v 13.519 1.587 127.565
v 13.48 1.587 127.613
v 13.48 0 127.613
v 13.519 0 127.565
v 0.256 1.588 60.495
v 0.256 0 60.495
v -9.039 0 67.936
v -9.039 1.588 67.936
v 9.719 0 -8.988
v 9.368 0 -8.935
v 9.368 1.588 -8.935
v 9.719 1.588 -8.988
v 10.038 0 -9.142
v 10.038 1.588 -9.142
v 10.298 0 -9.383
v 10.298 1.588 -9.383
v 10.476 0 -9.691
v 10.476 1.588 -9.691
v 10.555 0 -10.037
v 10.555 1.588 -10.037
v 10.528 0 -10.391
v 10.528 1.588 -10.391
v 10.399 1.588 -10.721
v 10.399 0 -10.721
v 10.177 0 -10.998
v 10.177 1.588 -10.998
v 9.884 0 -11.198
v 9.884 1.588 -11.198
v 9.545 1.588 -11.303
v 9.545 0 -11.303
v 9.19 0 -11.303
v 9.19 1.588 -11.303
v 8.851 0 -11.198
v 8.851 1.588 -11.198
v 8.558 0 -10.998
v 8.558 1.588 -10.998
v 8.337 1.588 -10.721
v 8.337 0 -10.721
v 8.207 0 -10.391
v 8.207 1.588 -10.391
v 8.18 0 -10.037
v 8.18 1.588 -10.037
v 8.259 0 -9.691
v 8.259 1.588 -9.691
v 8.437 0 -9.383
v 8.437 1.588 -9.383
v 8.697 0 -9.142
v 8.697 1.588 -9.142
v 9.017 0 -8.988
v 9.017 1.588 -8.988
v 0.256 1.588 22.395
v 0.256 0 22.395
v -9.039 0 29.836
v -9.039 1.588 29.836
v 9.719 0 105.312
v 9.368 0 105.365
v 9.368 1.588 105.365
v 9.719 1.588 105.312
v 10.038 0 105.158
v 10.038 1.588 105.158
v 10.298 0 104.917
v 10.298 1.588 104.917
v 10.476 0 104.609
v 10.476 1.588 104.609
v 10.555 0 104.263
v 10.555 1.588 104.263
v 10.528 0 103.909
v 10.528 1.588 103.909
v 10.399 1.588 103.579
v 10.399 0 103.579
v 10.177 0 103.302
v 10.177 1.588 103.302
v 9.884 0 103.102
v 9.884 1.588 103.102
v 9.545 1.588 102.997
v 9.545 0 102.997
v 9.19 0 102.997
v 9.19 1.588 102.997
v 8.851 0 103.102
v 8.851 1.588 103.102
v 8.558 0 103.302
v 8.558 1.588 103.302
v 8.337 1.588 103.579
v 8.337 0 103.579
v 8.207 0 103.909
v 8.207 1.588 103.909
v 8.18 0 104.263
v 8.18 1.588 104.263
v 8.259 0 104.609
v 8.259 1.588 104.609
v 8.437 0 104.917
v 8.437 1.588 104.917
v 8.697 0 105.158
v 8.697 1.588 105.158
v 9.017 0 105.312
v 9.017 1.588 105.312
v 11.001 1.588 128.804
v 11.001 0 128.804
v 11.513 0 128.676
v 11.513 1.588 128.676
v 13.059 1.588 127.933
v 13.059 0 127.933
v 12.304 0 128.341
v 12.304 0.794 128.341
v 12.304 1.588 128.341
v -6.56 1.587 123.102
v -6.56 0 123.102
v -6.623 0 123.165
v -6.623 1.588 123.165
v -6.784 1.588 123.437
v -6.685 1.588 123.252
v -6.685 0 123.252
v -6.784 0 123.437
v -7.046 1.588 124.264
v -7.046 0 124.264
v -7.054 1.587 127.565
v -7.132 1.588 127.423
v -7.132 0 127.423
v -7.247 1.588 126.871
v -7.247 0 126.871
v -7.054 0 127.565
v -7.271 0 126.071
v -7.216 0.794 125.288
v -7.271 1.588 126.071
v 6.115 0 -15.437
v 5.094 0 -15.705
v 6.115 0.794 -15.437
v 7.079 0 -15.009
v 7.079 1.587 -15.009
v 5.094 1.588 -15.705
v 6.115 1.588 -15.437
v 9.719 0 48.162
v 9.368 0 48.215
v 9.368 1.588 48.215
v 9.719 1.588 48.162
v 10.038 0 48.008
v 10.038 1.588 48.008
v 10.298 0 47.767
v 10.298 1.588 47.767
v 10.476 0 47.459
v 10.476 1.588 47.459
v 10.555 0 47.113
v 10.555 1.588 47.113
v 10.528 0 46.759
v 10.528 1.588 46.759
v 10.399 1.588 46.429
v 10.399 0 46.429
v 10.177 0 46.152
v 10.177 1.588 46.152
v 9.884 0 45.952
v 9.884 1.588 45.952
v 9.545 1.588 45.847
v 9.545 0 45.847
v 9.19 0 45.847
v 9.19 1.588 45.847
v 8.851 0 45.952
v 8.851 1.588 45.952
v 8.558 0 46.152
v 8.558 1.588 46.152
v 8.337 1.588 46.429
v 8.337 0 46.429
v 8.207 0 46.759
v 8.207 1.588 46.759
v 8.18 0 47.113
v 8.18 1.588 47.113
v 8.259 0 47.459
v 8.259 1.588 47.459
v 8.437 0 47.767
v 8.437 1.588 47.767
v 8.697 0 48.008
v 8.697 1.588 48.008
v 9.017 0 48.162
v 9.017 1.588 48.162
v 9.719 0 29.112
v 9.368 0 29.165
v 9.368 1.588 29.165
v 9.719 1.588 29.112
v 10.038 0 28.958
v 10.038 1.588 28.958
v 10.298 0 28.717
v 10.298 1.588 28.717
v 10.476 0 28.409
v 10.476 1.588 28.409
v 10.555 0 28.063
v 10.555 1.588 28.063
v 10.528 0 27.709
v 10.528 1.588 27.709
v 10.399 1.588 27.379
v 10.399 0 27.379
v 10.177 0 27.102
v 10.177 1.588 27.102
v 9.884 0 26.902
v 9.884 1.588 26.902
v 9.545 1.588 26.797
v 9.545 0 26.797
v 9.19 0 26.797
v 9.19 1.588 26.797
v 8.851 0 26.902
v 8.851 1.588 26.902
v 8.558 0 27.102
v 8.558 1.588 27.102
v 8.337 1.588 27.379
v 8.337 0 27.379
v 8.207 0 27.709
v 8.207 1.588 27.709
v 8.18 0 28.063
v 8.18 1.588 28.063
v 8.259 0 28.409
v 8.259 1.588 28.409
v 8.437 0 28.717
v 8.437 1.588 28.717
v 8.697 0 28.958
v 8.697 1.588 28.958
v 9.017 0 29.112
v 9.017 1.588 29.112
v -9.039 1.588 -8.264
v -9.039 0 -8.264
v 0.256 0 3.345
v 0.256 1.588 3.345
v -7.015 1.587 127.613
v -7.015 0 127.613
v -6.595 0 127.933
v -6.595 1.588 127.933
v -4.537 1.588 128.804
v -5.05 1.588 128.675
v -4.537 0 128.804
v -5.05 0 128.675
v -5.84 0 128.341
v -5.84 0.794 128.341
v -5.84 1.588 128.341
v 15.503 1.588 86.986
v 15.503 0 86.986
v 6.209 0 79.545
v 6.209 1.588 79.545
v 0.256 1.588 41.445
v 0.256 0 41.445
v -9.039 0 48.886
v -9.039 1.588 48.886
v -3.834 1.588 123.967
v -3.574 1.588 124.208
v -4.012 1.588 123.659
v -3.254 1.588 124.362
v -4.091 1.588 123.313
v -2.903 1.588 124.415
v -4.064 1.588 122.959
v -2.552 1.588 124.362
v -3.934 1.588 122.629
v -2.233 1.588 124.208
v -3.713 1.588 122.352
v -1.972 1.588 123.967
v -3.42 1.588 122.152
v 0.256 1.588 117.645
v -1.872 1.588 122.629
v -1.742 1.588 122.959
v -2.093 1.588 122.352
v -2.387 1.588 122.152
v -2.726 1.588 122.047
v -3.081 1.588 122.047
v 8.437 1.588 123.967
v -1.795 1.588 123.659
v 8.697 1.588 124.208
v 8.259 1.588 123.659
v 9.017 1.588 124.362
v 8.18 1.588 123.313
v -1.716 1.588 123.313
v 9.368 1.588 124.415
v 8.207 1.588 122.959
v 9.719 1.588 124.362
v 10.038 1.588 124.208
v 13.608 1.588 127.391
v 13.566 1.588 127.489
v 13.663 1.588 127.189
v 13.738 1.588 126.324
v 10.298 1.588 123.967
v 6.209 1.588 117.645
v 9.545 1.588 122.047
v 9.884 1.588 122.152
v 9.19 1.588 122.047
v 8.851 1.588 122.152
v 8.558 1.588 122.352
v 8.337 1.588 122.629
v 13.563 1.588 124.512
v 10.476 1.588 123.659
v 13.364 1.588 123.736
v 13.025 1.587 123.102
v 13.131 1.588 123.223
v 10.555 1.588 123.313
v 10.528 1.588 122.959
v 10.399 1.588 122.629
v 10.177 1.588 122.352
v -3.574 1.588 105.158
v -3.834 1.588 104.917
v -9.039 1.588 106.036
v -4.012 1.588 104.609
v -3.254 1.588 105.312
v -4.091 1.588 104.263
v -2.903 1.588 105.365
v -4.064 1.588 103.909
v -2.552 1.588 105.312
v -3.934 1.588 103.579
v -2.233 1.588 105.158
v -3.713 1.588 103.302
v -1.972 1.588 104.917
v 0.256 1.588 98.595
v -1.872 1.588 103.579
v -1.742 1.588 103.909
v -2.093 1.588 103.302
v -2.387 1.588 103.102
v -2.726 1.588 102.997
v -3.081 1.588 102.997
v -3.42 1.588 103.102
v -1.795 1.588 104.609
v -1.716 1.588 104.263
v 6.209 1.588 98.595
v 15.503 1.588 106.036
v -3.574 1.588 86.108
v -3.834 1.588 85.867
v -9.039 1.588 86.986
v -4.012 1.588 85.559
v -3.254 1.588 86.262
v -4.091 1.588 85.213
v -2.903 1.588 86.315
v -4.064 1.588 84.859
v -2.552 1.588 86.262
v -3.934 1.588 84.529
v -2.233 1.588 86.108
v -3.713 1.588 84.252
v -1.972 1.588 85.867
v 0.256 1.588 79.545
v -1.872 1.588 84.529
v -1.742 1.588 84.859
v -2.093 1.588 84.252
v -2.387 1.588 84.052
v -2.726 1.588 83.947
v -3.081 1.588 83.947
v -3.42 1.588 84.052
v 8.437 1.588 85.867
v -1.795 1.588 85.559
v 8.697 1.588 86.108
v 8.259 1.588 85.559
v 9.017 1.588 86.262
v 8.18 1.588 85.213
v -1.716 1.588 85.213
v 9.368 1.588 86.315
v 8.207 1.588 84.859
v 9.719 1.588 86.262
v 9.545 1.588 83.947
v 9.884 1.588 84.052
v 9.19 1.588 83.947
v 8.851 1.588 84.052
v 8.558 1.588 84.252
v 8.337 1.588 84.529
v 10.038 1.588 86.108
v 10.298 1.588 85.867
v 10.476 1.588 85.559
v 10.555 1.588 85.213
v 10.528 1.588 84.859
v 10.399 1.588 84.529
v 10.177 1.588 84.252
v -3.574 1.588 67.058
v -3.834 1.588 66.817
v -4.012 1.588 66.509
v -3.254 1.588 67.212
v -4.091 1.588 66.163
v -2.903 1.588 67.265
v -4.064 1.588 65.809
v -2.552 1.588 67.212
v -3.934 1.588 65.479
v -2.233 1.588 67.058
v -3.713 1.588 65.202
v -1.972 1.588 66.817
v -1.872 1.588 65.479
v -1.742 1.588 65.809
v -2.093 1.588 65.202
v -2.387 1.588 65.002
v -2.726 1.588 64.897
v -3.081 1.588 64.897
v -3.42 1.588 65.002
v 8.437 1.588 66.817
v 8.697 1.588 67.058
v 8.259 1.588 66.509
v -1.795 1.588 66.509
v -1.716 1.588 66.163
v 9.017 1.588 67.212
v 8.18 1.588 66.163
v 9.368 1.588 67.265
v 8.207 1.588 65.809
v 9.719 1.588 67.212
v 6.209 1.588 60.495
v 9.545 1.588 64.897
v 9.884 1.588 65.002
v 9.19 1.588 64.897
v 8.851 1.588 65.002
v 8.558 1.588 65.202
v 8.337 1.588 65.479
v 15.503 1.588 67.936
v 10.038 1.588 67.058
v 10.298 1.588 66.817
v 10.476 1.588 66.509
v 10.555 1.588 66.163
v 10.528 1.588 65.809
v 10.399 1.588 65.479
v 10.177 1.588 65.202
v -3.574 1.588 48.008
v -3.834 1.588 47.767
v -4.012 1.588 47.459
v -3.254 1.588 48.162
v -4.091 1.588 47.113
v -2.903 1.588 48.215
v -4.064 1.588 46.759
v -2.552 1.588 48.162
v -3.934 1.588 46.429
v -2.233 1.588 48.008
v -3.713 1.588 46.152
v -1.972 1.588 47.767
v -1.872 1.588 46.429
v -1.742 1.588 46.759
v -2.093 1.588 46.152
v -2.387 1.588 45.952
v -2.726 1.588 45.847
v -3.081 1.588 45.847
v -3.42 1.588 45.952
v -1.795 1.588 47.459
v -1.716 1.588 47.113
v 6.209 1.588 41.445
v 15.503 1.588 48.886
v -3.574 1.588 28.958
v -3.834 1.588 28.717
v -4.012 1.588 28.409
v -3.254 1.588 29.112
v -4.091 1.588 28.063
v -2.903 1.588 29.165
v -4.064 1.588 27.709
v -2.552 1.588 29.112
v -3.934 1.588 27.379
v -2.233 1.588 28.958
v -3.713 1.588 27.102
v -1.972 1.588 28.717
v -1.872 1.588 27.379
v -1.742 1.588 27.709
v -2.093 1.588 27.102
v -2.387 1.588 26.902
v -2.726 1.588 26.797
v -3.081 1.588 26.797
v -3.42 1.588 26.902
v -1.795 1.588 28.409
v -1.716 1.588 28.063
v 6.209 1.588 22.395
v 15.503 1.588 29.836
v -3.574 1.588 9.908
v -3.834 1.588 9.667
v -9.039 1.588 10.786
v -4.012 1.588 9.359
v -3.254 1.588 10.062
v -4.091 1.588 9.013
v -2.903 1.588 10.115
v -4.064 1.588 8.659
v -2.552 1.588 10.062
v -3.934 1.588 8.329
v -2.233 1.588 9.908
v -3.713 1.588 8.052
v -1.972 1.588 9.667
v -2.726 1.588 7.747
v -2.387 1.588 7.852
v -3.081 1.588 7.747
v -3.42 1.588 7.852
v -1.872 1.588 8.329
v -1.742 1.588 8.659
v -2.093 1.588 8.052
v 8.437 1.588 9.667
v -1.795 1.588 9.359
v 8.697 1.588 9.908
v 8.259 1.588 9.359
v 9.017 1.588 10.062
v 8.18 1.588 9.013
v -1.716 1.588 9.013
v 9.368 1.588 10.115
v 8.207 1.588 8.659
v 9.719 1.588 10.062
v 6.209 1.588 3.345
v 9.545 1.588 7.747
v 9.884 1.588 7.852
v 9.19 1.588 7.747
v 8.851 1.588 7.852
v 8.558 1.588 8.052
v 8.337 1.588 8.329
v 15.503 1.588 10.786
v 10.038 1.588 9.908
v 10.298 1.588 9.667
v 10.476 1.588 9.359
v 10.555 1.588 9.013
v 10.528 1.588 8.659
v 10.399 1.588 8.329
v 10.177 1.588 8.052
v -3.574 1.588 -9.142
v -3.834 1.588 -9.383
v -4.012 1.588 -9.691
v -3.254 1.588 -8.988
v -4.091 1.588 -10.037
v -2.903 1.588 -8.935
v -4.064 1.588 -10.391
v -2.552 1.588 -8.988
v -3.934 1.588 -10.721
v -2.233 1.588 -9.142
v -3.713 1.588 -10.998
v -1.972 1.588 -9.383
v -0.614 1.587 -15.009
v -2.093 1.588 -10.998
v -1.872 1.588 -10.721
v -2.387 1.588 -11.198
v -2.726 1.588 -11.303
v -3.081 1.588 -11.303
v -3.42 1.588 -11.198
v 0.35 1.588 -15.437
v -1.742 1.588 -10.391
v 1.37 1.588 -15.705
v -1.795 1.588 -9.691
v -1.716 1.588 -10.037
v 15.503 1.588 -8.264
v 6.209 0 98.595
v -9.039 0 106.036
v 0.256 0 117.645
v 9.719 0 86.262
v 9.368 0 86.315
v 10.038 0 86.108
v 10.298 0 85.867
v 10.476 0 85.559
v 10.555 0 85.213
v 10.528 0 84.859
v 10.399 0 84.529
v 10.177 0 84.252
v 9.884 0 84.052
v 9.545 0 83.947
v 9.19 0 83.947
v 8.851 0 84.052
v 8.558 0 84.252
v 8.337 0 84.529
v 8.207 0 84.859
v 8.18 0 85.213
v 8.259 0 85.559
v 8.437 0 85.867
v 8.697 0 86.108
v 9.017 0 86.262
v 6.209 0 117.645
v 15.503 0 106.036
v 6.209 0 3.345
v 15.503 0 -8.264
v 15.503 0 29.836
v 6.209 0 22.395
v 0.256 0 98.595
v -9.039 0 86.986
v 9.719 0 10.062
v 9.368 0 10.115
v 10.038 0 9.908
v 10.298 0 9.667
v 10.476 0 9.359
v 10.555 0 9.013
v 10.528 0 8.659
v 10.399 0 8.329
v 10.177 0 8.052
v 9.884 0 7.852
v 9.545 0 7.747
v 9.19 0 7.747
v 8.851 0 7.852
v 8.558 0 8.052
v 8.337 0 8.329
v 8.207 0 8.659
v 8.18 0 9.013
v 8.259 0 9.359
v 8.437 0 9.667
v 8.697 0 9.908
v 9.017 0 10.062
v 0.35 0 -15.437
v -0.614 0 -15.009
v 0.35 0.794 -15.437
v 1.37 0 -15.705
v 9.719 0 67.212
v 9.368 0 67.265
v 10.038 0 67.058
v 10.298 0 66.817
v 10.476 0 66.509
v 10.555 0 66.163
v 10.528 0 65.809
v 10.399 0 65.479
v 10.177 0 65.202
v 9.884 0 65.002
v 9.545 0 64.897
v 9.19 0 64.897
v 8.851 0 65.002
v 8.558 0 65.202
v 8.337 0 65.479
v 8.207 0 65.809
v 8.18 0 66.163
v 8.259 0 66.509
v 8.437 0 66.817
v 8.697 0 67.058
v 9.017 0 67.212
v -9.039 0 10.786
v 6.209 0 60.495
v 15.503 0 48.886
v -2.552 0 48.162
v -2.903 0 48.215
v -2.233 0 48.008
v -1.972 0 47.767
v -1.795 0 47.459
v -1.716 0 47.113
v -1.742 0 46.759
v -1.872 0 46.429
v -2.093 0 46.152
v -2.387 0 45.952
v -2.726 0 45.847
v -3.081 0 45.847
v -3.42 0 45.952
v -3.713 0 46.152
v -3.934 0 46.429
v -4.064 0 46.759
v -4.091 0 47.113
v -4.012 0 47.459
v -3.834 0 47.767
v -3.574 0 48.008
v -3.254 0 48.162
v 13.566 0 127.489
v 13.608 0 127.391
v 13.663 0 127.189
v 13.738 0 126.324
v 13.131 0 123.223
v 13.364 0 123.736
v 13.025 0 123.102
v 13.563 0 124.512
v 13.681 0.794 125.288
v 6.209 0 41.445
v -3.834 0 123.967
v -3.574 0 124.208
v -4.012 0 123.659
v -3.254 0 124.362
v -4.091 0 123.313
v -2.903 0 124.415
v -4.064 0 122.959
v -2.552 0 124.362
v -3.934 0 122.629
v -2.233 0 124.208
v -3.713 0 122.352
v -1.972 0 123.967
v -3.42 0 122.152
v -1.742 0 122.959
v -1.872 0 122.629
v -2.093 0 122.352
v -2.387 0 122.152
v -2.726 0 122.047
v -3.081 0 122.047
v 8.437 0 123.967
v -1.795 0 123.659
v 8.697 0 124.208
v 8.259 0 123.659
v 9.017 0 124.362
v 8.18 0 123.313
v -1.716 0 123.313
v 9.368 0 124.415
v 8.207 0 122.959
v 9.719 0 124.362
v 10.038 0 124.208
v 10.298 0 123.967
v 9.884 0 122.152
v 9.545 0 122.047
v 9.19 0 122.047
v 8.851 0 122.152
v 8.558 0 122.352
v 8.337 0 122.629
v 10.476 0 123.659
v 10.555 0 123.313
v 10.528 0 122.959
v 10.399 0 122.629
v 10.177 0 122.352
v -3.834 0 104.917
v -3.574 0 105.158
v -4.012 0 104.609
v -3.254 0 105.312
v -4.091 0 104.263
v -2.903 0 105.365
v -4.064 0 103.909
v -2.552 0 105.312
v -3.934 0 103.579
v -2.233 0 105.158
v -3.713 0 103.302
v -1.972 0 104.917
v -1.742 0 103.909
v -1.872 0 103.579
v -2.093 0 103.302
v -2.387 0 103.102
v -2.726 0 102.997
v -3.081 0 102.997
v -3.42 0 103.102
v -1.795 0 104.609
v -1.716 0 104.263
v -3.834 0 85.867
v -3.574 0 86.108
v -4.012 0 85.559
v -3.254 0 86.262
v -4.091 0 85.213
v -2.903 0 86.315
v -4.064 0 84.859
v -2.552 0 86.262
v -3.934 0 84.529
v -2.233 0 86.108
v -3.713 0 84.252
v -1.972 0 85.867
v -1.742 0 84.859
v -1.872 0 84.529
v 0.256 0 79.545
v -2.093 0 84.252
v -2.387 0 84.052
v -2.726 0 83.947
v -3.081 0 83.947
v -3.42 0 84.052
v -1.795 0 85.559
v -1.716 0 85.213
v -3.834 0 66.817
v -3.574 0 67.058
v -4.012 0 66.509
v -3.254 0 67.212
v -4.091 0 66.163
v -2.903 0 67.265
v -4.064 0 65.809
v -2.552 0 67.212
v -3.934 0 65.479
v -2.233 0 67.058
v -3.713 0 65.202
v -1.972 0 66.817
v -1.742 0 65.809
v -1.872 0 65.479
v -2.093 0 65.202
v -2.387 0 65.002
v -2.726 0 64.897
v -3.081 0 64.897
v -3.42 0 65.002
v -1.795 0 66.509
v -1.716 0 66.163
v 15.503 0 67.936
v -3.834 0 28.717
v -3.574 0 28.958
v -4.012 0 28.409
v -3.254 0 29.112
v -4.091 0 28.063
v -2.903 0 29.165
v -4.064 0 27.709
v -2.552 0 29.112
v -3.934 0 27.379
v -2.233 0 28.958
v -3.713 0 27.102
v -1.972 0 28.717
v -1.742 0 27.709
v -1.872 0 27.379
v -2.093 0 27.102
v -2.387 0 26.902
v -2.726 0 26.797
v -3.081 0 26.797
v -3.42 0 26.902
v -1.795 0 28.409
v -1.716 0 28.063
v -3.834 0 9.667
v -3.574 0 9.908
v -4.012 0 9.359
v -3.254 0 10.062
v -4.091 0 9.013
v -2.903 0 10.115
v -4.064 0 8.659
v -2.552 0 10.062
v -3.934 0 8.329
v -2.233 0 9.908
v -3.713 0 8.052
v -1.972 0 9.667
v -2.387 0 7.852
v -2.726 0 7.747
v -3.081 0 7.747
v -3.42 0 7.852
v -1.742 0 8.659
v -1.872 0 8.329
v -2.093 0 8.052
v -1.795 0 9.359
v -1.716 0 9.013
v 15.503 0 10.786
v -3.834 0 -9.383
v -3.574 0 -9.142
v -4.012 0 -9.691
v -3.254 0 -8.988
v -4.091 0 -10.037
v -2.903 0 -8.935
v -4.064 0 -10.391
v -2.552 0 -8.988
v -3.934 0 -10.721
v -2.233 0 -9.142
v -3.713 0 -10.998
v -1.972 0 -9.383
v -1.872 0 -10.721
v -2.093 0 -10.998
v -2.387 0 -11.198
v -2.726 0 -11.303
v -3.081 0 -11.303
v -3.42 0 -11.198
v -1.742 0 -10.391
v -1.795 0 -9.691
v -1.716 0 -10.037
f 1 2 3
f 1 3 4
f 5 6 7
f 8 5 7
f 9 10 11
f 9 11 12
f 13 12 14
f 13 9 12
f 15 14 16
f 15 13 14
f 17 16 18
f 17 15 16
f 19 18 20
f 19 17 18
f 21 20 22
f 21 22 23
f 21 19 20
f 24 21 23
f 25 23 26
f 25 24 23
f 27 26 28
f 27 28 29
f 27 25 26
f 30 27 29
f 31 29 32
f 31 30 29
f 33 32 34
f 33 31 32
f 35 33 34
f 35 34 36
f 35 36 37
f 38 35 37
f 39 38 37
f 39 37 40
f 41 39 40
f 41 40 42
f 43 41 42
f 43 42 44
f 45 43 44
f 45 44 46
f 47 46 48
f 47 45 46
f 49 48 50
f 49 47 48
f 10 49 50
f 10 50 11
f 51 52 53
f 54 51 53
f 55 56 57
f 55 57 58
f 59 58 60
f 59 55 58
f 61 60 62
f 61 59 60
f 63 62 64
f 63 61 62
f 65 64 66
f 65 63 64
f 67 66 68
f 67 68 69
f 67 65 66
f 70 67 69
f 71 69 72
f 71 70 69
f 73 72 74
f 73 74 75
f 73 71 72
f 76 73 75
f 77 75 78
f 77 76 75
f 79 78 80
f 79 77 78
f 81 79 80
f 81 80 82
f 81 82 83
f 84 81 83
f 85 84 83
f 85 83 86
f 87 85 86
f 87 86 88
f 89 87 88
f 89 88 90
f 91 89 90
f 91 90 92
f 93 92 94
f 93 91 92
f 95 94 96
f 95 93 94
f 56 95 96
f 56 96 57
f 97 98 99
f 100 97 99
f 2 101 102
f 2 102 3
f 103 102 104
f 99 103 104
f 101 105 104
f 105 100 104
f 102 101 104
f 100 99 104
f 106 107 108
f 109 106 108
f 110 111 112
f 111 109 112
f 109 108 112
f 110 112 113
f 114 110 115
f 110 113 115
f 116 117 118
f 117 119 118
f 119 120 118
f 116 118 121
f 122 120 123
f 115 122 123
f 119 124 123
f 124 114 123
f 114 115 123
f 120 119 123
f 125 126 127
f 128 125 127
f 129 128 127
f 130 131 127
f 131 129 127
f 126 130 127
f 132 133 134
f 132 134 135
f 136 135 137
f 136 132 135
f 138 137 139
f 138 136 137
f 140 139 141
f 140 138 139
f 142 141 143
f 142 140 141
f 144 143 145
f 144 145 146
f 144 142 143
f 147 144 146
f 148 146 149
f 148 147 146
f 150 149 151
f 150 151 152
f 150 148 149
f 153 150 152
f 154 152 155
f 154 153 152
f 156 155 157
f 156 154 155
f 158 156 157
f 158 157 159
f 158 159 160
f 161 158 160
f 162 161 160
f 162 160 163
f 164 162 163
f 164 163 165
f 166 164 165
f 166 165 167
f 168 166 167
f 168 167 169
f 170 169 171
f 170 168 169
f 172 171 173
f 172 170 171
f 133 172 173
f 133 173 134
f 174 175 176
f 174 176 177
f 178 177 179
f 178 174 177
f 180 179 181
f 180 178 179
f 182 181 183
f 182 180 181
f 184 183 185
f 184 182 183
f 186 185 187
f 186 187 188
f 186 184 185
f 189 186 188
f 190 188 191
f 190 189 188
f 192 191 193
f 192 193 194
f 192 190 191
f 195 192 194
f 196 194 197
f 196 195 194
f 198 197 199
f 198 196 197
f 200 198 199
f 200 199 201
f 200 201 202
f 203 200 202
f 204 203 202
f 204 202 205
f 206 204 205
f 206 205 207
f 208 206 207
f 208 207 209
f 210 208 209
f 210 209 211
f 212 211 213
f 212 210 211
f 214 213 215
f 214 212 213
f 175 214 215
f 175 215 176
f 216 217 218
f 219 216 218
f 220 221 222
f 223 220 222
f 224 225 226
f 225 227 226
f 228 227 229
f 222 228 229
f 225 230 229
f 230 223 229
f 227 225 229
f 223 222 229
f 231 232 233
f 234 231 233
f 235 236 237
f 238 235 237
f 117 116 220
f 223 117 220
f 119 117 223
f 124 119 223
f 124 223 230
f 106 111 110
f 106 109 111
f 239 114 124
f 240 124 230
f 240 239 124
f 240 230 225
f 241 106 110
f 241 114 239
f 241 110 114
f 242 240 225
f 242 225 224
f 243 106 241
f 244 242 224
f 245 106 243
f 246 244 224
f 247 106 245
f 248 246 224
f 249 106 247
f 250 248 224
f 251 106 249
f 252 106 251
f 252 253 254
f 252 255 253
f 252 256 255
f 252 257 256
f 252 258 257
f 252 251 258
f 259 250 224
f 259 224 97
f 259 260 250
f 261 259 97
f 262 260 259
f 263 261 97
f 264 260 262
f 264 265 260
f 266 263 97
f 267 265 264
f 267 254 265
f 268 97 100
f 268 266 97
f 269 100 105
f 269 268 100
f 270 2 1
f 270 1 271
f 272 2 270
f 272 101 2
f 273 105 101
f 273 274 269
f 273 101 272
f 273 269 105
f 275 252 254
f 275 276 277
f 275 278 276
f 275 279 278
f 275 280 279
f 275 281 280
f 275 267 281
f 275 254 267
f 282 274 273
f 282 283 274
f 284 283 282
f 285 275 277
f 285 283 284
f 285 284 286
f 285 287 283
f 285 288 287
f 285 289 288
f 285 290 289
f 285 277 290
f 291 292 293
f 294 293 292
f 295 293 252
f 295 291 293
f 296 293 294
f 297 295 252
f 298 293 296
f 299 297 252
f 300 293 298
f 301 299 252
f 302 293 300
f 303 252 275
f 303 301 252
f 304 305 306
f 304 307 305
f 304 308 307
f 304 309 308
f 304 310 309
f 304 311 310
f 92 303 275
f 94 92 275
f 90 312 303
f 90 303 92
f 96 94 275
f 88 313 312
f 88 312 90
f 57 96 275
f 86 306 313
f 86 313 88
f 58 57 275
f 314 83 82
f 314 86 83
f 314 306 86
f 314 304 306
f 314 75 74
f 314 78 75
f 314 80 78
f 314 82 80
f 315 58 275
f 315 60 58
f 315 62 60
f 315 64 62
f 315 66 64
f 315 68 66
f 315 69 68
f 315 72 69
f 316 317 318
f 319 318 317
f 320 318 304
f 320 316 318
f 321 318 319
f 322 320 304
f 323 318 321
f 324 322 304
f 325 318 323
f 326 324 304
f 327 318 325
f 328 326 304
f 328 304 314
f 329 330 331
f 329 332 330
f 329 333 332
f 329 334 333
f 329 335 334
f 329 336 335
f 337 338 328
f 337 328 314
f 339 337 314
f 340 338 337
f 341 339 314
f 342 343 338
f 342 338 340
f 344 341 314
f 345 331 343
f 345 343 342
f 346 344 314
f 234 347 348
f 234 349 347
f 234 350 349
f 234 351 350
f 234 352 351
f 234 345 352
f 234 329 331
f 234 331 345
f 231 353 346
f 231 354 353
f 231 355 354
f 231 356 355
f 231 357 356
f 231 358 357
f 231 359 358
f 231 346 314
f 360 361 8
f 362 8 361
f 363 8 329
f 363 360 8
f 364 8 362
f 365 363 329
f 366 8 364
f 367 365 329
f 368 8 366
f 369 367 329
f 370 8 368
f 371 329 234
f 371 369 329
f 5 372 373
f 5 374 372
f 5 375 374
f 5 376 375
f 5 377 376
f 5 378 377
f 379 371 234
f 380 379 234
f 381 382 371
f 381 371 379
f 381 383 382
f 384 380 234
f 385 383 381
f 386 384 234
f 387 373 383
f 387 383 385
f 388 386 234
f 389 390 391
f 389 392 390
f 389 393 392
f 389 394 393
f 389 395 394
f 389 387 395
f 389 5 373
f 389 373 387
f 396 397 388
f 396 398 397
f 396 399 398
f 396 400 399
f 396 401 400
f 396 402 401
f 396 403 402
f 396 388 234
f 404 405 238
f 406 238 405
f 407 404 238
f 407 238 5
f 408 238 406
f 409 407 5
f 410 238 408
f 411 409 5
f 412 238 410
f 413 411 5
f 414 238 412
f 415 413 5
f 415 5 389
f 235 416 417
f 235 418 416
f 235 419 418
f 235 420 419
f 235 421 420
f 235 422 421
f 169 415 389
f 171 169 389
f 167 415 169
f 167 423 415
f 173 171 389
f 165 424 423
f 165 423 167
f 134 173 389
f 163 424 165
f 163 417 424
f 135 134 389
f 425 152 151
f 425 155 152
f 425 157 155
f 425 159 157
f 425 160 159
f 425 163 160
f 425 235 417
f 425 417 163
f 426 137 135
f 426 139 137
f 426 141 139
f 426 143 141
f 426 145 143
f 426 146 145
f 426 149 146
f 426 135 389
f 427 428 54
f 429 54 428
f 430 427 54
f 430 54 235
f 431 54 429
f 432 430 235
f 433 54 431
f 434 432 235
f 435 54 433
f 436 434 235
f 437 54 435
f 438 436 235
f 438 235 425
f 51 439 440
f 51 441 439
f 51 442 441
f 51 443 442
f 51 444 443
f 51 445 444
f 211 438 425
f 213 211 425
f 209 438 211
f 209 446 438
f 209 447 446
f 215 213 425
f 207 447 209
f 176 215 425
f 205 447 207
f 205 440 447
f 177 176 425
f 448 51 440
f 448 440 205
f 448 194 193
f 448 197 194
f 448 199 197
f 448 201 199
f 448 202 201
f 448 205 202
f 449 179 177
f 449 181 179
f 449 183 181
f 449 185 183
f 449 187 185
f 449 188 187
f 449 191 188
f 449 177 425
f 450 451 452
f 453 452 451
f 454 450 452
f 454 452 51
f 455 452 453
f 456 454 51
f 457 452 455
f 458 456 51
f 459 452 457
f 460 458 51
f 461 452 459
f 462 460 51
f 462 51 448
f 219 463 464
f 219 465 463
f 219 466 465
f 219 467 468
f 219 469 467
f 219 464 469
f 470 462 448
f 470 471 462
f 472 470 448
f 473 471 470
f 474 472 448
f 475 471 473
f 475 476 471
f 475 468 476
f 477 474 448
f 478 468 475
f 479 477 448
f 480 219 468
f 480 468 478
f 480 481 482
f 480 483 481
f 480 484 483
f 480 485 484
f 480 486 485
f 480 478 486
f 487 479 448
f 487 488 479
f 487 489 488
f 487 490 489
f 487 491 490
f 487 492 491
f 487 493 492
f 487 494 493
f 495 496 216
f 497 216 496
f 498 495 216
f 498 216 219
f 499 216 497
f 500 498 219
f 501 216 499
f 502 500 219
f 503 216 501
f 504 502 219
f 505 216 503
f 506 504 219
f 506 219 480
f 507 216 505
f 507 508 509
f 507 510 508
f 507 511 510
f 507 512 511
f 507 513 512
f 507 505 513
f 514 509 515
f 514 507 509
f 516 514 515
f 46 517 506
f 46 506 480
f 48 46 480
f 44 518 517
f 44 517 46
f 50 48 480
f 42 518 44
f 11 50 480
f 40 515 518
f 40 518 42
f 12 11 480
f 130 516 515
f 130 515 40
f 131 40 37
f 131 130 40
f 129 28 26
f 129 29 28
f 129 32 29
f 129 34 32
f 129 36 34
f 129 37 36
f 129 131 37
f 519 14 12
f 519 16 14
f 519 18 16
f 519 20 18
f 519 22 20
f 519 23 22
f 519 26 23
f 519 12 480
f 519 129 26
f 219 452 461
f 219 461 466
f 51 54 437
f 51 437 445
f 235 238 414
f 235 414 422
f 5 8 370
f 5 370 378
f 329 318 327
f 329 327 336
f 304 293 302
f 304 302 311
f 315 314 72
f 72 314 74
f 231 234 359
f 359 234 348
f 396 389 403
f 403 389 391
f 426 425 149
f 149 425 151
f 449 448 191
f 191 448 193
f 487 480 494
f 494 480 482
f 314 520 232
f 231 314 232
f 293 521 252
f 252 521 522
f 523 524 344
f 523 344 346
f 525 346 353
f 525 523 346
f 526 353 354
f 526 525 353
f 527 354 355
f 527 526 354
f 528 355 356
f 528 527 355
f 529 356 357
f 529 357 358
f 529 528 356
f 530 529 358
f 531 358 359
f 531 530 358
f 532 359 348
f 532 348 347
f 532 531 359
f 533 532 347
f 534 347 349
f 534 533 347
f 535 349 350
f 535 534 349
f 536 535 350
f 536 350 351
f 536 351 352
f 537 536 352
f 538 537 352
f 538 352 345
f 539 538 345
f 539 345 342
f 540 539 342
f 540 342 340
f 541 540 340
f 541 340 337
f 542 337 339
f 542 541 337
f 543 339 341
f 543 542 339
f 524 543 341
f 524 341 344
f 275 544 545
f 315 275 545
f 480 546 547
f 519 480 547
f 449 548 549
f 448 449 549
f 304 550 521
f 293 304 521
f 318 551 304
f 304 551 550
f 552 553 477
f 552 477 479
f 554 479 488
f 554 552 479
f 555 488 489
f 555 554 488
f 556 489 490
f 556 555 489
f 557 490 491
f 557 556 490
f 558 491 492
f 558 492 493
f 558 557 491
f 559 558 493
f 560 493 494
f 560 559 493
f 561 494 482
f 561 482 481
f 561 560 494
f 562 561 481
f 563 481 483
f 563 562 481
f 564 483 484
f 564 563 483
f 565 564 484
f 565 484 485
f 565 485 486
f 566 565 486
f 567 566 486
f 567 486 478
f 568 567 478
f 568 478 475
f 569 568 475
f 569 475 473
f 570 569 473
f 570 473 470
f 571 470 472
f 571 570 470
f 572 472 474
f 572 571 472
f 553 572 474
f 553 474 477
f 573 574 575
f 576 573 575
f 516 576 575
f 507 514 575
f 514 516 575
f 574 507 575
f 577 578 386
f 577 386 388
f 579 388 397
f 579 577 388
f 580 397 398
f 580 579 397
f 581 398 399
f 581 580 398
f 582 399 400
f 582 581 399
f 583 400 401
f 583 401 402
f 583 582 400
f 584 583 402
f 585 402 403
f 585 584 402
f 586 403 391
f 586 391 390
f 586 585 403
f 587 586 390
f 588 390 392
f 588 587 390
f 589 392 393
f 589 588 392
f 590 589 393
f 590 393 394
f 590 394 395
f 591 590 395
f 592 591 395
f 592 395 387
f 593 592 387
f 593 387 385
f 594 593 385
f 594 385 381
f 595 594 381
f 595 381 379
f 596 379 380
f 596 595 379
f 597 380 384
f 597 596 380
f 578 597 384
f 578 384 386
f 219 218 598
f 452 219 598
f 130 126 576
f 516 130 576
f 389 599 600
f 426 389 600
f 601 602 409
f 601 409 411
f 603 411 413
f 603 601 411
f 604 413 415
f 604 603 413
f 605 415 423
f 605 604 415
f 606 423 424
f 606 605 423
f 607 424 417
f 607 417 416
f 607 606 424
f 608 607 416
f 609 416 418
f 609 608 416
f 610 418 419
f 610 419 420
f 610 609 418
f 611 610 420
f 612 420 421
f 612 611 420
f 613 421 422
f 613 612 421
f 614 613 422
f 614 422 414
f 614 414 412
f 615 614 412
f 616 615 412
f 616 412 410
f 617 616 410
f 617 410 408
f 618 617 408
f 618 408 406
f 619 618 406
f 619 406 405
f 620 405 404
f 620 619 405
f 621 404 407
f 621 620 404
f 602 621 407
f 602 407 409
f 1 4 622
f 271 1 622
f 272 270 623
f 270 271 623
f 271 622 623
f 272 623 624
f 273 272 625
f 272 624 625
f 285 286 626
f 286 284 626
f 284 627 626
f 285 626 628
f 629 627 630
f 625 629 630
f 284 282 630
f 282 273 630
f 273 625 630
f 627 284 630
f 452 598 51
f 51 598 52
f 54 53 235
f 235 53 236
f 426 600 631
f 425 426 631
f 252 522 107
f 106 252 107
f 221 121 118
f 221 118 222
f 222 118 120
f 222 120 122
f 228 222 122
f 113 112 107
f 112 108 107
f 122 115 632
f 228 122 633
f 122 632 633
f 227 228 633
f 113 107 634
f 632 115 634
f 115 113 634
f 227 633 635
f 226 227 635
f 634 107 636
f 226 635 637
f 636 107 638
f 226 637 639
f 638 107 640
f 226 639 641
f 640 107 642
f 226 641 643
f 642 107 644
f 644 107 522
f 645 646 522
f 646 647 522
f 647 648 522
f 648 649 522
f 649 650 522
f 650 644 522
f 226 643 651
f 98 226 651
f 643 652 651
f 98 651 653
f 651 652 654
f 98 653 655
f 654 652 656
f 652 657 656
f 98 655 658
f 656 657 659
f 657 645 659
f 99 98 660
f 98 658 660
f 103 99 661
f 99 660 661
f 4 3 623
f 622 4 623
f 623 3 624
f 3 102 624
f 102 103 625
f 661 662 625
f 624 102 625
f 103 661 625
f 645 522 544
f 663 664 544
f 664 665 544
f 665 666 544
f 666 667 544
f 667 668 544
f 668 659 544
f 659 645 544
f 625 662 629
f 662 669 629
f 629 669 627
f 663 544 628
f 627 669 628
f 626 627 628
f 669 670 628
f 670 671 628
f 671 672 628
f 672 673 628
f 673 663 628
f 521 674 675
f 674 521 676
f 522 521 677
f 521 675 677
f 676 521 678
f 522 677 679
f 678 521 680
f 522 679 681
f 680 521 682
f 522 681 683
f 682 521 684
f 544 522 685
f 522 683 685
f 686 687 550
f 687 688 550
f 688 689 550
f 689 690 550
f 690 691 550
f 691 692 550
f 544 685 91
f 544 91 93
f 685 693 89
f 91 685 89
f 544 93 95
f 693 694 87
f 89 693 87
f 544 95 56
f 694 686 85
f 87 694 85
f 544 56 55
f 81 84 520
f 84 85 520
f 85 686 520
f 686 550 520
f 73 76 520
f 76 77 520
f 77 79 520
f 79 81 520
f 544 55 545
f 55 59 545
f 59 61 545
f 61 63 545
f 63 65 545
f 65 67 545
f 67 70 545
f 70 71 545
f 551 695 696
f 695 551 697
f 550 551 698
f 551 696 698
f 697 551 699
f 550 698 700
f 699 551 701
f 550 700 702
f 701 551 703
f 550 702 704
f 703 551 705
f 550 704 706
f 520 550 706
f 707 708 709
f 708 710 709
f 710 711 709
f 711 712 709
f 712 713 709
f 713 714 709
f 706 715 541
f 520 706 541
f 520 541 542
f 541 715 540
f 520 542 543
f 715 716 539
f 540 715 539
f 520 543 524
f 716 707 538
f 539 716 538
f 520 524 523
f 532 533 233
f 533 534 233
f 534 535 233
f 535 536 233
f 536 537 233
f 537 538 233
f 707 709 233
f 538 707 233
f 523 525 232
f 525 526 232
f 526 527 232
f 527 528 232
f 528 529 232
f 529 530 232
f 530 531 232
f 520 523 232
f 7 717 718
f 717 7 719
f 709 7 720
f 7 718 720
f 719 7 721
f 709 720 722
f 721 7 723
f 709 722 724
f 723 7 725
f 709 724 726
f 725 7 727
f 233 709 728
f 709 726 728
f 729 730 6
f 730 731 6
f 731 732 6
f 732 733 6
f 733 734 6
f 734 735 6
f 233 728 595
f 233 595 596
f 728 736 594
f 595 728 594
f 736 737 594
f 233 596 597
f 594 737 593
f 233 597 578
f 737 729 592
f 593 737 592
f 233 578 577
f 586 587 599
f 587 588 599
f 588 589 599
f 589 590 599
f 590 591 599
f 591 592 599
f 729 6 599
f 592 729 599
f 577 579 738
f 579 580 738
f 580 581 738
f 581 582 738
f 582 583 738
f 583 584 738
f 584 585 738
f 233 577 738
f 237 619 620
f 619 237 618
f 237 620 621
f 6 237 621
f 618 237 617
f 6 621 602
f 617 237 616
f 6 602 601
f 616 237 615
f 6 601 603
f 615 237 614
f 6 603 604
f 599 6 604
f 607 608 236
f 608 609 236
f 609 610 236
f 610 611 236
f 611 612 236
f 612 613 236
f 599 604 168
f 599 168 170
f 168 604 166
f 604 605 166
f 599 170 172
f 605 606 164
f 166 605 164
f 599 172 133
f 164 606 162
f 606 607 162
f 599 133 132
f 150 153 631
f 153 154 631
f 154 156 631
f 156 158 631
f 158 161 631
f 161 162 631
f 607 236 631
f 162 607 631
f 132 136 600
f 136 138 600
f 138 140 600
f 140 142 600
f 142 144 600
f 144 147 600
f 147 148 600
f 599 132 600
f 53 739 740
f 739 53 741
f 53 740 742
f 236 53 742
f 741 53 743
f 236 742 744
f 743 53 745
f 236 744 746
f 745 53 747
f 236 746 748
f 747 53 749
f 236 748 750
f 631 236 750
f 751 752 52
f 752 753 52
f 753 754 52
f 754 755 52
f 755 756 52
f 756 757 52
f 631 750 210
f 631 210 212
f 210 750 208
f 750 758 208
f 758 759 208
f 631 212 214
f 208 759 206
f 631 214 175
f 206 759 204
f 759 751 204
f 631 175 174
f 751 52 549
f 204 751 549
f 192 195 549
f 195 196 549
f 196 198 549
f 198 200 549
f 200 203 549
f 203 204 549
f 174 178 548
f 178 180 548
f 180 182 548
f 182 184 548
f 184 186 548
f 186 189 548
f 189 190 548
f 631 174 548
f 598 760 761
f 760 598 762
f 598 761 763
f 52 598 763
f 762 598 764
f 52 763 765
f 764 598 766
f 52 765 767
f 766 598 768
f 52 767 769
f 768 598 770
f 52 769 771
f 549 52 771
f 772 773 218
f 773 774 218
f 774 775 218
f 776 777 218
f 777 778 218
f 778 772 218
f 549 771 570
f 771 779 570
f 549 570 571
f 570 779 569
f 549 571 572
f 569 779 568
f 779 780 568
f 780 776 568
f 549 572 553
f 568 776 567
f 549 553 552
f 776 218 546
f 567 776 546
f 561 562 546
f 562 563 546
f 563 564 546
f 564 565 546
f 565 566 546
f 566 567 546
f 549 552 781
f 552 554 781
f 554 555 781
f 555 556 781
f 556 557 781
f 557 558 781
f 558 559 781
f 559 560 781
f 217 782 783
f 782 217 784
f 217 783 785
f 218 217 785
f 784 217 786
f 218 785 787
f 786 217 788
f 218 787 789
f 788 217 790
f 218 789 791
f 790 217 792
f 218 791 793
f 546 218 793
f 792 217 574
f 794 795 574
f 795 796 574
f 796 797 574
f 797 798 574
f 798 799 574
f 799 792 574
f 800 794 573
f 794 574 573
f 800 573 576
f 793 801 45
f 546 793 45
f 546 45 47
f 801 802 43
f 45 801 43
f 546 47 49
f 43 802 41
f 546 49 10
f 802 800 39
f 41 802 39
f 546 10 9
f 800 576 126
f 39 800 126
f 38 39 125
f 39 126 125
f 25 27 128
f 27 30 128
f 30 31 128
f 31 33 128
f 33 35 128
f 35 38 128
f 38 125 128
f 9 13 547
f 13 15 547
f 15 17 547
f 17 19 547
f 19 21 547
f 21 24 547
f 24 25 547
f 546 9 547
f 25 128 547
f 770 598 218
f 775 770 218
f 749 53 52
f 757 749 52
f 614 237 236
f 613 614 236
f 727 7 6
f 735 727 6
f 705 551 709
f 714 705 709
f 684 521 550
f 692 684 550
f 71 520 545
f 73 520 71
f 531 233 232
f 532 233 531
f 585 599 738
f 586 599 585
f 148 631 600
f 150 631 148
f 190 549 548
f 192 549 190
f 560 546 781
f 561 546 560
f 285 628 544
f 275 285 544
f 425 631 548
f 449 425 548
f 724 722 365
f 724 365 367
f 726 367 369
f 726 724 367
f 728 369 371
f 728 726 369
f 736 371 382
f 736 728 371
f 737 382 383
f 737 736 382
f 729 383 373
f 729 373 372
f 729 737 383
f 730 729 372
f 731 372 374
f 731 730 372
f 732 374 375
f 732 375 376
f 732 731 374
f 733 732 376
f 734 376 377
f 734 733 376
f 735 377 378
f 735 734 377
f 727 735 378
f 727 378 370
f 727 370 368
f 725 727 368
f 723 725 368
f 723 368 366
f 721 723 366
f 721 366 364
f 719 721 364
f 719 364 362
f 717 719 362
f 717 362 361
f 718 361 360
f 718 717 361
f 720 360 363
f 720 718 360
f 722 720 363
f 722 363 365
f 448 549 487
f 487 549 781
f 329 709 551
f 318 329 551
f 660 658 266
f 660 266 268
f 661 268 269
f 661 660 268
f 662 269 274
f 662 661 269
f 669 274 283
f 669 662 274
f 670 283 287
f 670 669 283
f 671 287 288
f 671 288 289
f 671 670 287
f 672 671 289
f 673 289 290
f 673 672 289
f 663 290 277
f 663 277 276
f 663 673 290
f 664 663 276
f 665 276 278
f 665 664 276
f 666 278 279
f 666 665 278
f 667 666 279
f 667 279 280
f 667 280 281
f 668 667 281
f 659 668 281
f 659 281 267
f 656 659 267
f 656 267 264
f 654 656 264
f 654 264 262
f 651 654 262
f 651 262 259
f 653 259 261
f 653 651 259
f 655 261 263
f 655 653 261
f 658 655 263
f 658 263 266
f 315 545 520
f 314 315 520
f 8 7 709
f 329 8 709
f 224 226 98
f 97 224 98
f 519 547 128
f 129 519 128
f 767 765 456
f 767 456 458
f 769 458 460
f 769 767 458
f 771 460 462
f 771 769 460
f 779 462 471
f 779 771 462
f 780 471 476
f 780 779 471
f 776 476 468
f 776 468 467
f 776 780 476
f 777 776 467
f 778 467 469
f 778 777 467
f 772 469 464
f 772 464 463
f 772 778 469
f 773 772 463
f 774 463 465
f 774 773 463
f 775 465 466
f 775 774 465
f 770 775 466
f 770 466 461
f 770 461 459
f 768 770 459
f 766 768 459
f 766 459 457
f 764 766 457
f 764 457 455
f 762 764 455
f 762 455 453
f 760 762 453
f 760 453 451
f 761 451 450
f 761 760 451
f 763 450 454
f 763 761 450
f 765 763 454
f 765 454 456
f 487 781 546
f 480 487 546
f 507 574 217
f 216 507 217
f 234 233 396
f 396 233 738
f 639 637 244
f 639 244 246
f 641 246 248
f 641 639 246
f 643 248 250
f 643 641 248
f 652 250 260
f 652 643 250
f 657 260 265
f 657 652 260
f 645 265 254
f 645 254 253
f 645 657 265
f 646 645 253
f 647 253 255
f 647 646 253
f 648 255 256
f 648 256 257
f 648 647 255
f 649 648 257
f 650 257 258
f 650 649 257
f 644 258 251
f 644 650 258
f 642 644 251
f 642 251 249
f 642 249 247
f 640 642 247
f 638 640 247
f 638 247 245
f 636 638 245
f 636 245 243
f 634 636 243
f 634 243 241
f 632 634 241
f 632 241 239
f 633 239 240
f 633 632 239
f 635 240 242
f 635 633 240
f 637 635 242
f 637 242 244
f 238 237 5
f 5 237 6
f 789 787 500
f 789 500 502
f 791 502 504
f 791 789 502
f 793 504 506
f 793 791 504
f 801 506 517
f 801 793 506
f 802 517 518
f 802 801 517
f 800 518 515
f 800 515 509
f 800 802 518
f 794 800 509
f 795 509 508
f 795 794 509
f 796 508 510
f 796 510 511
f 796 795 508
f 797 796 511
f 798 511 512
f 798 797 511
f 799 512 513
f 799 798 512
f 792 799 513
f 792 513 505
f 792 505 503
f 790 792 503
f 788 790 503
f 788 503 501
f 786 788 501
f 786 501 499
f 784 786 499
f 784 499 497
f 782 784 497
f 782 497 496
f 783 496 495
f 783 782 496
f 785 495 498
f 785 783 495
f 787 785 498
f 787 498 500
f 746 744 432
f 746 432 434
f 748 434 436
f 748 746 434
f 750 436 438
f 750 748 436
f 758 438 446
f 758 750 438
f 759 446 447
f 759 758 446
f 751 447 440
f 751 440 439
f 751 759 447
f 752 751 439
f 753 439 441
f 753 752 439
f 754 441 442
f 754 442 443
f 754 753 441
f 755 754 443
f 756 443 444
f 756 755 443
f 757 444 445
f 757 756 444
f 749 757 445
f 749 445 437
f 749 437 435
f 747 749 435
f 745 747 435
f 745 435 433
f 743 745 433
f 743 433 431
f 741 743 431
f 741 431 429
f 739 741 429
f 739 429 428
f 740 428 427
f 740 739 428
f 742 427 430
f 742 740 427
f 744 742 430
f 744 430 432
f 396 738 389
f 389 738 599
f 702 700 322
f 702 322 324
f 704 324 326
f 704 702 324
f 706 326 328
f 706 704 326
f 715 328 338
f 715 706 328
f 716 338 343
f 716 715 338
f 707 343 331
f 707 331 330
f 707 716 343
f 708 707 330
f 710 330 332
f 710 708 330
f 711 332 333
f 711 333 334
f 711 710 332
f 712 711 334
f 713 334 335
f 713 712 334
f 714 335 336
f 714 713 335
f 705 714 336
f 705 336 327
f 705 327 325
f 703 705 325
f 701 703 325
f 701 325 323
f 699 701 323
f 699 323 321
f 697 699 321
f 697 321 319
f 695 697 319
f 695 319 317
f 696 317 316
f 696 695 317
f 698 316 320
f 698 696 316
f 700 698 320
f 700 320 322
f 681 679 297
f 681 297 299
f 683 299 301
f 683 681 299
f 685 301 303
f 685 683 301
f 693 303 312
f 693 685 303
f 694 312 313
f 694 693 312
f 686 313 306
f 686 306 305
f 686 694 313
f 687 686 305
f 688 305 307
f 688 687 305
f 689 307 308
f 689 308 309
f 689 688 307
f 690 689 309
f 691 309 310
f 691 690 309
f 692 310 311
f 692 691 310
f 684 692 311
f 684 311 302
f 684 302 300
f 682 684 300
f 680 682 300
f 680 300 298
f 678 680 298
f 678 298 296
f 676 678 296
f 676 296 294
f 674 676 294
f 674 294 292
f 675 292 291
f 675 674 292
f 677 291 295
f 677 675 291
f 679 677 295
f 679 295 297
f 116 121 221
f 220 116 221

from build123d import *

# Parameters (mm, degrees)
SKETCH2_R           = 1.190625
BOSS_EXTRUDE1_DEPTH = 1.5875
FILLET1_SIZE        = 3.175


with BuildPart() as part:
    # Sketch2 → Boss-Extrude1 (new body)
    with BuildSketch(Plane(origin=(0, 0, 0), x_dir=(1, 0, 0), z_dir=(0, 1, 0))):
        Polygon((-9.038686402, -10.786161972), (0.255627025, -22.394755722), (-9.038686402, -29.836161972), (0.255627025, -41.444755722), (-9.038686402, -48.886161972), (0.255627025, -60.494755722), (-9.038686402, -67.936161972), (0.255627025, -79.544755722), (-9.038686402, -86.986161972), (0.255627025, -98.594755722), (-9.038686402, -106.036161972), (0.255627025, -117.644755722), (-9.038686402, -125.086161972), (-6.062123902, -128.803887343), (12.526502953, -128.803887343), (15.503065453, -125.086161972), (6.208752025, -117.644755722), (15.503065453, -106.036161972), (6.208752025, -98.594755722), (15.503065453, -86.986161972), (6.208752025, -79.544755722), (15.503065453, -67.936161972), (6.208752025, -60.494755722), (15.503065453, -48.886161972), (6.208752025, -41.444755722), (15.503065453, -29.836161972), (6.208752025, -22.394755722), (15.503065453, -10.786161972), (6.208752025, -3.344755722), (15.503065453, 8.263838028), (6.208752025, 15.705244278), (0.255627025, 15.705244278), (-9.038686402, 8.263838028), (0.255627025, -3.344755722), align=None)
        with Locations(Location((-2.903248438, 10.125678468, 0), (0, 0, 270))):
            Circle(SKETCH2_R, mode=Mode.SUBTRACT)
        with Locations(Location((-2.903248438, -8.924321532, 0), (0, 0, 270))):
            Circle(SKETCH2_R, mode=Mode.SUBTRACT)
        with Locations(Location((-2.903248438, -27.974321532, 0), (0, 0, 270))):
            Circle(SKETCH2_R, mode=Mode.SUBTRACT)
        with Locations(Location((-2.903248438, -47.024321532, 0), (0, 0, 270))):
            Circle(SKETCH2_R, mode=Mode.SUBTRACT)
        with Locations(Location((-2.903248438, -66.074321532, 0), (0, 0, 270))):
            Circle(SKETCH2_R, mode=Mode.SUBTRACT)
        with Locations(Location((-2.903248438, -85.124321532, 0), (0, 0, 270))):
            Circle(SKETCH2_R, mode=Mode.SUBTRACT)
        with Locations(Location((-2.903248438, -104.174321532, 0), (0, 0, 270))):
            Circle(SKETCH2_R, mode=Mode.SUBTRACT)
        with Locations(Location((-2.903248438, -123.224321532, 0), (0, 0, 270))):
            Circle(SKETCH2_R, mode=Mode.SUBTRACT)
        with Locations(Location((9.367627489, -123.224321532, 0), (0, 0, 270))):
            Circle(SKETCH2_R, mode=Mode.SUBTRACT)
        with Locations(Location((9.367627489, -104.174321532, 0), (0, 0, 270))):
            Circle(SKETCH2_R, mode=Mode.SUBTRACT)
        with Locations(Location((9.367627489, -85.124321532, 0), (0, 0, 270))):
            Circle(SKETCH2_R, mode=Mode.SUBTRACT)
        with Locations(Location((9.367627489, -66.074321532, 0), (0, 0, 270))):
            Circle(SKETCH2_R, mode=Mode.SUBTRACT)
        with Locations(Location((9.367627489, -47.024321532, 0), (0, 0, 270))):
            Circle(SKETCH2_R, mode=Mode.SUBTRACT)
        with Locations(Location((9.367627489, -27.974321532, 0), (0, 0, 270))):
            Circle(SKETCH2_R, mode=Mode.SUBTRACT)
        with Locations(Location((9.367627489, -8.924321532, 0), (0, 0, 270))):
            Circle(SKETCH2_R, mode=Mode.SUBTRACT)
        with Locations(Location((9.367627489, 10.125678468, 0), (0, 0, 270))):
            Circle(SKETCH2_R, mode=Mode.SUBTRACT)
    extrude(amount=BOSS_EXTRUDE1_DEPTH)

    # Fillet1
    # a fillet whose section is not a circle: 3.175 mm, written as the material it takes off along each edge
    with BuildSketch(Plane(origin=(6.208752025, -2.786065678, -15.705244278), x_dir=(0.7806247497998005, 0, 0.6249999999999992), z_dir=(0, 1, 0)), Plane(origin=(0.255627025, -2.786065678, -15.705244278), x_dir=(1, 0, 0), z_dir=(0, 1, 0))) as fillet1_piece_1:
        with BuildLine():
            Bezier((1.114426271, 0), (0, 0), (-0.869948729, -0.696516419), weights=[1, 0.299581461, 1])
            Line((-0.869948729, -0.696516419), (0, 0))
            Line((0, 0), (1.114426271, 0))
        make_face()
    extrude(amount=7.159631355, mode=Mode.SUBTRACT)
    with BuildSketch(Plane(origin=(-9.038686402, -7.9375, 125.086161972), x_dir=(0.7806247497997997, 0, -0.625), z_dir=(0, 1, 0)), Plane(origin=(15.503065453, -7.9375, 125.086161972), x_dir=(-0.6250000000125396, 0, 0.78062474978976), z_dir=(0, 1, 0))) as fillet1_piece_2:
        with BuildLine():
            Bezier((FILLET1_SIZE, 0), (0, 0), (0, -FILLET1_SIZE), weights=[1, 0.224506403, 1])
            Line((0, -FILLET1_SIZE), (0, 0))
            Line((0, 0), (FILLET1_SIZE, 0))
        make_face()
    extrude(amount=17.4625, mode=Mode.SUBTRACT)
    with BuildSketch(Plane(origin=(12.526502953, -3.813051662, 128.803887343), x_dir=(-1, 0, 0), z_dir=(0, 1, 0)), Plane(origin=(-6.062123902, -3.813051662, 128.803887343), x_dir=(-0.6249999999999978, 0, -0.7806247497998016), z_dir=(0, 1, 0))) as fillet1_piece_3:
        with BuildLine():
            Bezier((1.525220665, 0), (0, 0), (-0.953262916, -1.190625), weights=[1, 0.286190632, 1])
            Line((-0.953262916, -1.190625), (0, 0))
            Line((0, 0), (1.525220665, 0))
        make_face()
    extrude(amount=9.213603325, mode=Mode.SUBTRACT)


solid = part.part
